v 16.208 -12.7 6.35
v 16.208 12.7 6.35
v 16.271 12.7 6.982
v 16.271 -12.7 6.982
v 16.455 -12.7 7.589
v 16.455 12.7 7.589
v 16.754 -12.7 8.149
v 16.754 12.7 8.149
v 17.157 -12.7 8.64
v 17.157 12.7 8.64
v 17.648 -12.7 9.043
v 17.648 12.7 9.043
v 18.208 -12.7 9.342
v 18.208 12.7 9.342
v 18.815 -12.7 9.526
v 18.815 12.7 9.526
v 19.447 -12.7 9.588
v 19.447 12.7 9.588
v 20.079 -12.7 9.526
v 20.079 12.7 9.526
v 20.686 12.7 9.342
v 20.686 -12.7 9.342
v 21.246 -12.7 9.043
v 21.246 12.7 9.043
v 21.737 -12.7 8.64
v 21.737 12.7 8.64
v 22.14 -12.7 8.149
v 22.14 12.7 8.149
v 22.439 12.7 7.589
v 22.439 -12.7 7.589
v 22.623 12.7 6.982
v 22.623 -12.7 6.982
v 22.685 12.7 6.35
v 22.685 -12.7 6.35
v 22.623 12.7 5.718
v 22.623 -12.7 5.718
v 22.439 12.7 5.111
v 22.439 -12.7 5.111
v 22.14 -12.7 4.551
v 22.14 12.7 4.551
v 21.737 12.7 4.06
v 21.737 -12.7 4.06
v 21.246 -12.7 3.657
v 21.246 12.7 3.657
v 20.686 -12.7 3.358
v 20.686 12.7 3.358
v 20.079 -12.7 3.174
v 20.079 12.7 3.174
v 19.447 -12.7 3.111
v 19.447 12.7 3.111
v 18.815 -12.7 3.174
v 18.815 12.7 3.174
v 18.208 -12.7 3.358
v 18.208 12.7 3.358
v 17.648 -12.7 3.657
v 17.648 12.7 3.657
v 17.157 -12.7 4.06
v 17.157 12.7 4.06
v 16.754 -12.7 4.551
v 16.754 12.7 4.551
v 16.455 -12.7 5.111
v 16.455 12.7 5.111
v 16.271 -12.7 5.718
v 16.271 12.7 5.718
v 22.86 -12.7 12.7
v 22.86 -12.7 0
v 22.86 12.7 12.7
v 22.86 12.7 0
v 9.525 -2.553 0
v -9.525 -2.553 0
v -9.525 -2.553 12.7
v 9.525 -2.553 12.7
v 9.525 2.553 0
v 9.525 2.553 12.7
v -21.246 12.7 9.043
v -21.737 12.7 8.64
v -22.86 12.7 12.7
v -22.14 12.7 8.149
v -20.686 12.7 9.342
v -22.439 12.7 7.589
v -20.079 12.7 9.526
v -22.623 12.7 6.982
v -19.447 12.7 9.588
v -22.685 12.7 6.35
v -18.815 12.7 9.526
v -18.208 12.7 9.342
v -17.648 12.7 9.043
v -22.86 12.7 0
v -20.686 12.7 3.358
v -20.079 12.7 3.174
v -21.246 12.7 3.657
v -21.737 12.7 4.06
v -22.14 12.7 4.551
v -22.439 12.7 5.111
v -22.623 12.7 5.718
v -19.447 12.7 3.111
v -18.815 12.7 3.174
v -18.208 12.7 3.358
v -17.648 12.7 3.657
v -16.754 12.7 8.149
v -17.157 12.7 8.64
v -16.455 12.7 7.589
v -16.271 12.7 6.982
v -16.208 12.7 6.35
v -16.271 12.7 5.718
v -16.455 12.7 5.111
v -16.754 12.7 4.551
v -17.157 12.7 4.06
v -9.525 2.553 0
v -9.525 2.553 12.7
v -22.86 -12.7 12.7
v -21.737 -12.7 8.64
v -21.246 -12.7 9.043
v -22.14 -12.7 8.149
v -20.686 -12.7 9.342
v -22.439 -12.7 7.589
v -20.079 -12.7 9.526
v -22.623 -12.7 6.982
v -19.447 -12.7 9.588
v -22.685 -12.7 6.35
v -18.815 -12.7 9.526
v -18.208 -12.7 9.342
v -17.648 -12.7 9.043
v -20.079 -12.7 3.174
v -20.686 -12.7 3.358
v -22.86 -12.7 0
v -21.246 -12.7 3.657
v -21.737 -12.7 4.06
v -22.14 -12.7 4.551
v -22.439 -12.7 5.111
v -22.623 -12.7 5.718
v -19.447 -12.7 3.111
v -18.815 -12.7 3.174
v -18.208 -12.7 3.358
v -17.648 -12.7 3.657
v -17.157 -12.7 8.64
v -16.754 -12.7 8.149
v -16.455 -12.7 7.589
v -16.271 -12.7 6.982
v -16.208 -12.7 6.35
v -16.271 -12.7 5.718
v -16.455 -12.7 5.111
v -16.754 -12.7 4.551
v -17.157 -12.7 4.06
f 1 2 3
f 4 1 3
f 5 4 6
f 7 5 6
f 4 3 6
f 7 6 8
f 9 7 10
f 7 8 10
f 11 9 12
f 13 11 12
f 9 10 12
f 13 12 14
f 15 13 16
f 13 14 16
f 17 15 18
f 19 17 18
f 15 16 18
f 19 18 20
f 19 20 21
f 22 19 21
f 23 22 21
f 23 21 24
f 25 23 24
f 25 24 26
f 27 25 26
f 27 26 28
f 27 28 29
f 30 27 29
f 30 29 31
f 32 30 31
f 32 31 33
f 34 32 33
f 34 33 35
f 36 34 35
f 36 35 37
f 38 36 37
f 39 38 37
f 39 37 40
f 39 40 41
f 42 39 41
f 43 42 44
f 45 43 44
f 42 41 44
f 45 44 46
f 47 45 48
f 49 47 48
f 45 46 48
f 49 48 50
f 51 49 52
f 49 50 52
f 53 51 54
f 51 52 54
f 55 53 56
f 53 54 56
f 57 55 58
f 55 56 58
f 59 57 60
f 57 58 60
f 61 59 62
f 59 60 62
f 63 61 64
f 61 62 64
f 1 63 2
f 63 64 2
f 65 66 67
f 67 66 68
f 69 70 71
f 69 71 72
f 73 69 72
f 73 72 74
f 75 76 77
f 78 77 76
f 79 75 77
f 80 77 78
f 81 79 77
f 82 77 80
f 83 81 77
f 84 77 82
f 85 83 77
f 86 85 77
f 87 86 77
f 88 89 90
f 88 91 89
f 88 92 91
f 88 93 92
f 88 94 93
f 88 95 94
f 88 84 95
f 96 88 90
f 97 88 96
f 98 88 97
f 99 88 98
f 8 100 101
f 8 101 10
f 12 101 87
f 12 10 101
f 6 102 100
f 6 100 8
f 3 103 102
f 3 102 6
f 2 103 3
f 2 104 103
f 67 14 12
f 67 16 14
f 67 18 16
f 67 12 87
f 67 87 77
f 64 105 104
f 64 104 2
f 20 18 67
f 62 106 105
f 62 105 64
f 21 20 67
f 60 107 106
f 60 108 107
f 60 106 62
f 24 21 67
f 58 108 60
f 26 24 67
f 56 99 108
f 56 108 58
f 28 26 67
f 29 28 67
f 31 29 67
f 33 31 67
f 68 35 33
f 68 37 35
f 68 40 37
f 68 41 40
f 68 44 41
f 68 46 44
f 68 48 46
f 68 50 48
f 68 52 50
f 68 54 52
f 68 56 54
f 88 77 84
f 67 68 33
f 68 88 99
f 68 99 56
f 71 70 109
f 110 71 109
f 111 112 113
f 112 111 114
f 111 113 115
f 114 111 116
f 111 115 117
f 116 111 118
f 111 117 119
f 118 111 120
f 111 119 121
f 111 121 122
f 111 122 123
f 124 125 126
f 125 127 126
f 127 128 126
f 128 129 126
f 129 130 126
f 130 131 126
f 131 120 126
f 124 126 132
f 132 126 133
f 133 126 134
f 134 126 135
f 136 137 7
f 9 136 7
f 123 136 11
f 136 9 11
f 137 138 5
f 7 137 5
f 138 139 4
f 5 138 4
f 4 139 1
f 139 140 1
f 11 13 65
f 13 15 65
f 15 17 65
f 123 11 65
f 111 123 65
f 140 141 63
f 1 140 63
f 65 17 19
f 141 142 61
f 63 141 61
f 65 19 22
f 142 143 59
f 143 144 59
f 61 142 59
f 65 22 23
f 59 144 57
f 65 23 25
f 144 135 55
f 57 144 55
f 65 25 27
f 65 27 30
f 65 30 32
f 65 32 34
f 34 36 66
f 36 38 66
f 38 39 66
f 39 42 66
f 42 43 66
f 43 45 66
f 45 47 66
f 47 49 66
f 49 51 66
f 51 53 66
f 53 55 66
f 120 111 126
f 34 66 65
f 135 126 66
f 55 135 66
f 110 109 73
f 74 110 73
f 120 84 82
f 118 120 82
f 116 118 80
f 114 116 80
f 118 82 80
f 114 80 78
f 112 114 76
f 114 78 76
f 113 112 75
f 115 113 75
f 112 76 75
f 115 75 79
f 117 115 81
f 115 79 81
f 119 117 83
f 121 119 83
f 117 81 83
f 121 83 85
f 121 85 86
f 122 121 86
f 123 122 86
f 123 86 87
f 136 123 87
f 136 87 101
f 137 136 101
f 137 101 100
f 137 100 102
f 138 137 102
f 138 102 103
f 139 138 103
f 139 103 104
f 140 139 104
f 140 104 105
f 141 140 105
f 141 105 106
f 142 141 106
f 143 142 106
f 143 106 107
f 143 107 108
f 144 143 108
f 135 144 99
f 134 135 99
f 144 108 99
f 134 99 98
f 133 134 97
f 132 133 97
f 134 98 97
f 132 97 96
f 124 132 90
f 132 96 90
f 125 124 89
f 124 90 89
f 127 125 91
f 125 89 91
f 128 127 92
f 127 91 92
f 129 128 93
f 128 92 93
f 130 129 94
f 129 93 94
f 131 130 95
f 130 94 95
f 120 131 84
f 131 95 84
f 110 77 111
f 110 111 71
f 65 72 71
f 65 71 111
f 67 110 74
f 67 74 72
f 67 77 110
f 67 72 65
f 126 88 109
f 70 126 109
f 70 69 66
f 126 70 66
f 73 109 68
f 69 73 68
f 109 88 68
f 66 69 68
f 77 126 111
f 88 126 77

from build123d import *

# Parameters (mm, degrees)
F0_W     = 45.72
F0_H     = 25.4
F0_W_2   = 19.05
F0_H_2   = 5.1054
F1_DEPTH = 12.7
F3_D     = 6.477


with BuildPart() as f1:
    # F0 (on Top) → F1 (new body)
    with BuildSketch(Plane.XY):
        Rectangle(F0_W, F0_H)
        Rectangle(F0_W_2, F0_H_2, mode=Mode.SUBTRACT)
    extrude(amount=F1_DEPTH)

    # F3 (through all)
    with Locations(Plane.XZ.offset(12.7)):
        with Locations((-19.446875, 6.35), (19.446875, 6.35)):
            Hole(F3_D / 2)


solid = f1.part
